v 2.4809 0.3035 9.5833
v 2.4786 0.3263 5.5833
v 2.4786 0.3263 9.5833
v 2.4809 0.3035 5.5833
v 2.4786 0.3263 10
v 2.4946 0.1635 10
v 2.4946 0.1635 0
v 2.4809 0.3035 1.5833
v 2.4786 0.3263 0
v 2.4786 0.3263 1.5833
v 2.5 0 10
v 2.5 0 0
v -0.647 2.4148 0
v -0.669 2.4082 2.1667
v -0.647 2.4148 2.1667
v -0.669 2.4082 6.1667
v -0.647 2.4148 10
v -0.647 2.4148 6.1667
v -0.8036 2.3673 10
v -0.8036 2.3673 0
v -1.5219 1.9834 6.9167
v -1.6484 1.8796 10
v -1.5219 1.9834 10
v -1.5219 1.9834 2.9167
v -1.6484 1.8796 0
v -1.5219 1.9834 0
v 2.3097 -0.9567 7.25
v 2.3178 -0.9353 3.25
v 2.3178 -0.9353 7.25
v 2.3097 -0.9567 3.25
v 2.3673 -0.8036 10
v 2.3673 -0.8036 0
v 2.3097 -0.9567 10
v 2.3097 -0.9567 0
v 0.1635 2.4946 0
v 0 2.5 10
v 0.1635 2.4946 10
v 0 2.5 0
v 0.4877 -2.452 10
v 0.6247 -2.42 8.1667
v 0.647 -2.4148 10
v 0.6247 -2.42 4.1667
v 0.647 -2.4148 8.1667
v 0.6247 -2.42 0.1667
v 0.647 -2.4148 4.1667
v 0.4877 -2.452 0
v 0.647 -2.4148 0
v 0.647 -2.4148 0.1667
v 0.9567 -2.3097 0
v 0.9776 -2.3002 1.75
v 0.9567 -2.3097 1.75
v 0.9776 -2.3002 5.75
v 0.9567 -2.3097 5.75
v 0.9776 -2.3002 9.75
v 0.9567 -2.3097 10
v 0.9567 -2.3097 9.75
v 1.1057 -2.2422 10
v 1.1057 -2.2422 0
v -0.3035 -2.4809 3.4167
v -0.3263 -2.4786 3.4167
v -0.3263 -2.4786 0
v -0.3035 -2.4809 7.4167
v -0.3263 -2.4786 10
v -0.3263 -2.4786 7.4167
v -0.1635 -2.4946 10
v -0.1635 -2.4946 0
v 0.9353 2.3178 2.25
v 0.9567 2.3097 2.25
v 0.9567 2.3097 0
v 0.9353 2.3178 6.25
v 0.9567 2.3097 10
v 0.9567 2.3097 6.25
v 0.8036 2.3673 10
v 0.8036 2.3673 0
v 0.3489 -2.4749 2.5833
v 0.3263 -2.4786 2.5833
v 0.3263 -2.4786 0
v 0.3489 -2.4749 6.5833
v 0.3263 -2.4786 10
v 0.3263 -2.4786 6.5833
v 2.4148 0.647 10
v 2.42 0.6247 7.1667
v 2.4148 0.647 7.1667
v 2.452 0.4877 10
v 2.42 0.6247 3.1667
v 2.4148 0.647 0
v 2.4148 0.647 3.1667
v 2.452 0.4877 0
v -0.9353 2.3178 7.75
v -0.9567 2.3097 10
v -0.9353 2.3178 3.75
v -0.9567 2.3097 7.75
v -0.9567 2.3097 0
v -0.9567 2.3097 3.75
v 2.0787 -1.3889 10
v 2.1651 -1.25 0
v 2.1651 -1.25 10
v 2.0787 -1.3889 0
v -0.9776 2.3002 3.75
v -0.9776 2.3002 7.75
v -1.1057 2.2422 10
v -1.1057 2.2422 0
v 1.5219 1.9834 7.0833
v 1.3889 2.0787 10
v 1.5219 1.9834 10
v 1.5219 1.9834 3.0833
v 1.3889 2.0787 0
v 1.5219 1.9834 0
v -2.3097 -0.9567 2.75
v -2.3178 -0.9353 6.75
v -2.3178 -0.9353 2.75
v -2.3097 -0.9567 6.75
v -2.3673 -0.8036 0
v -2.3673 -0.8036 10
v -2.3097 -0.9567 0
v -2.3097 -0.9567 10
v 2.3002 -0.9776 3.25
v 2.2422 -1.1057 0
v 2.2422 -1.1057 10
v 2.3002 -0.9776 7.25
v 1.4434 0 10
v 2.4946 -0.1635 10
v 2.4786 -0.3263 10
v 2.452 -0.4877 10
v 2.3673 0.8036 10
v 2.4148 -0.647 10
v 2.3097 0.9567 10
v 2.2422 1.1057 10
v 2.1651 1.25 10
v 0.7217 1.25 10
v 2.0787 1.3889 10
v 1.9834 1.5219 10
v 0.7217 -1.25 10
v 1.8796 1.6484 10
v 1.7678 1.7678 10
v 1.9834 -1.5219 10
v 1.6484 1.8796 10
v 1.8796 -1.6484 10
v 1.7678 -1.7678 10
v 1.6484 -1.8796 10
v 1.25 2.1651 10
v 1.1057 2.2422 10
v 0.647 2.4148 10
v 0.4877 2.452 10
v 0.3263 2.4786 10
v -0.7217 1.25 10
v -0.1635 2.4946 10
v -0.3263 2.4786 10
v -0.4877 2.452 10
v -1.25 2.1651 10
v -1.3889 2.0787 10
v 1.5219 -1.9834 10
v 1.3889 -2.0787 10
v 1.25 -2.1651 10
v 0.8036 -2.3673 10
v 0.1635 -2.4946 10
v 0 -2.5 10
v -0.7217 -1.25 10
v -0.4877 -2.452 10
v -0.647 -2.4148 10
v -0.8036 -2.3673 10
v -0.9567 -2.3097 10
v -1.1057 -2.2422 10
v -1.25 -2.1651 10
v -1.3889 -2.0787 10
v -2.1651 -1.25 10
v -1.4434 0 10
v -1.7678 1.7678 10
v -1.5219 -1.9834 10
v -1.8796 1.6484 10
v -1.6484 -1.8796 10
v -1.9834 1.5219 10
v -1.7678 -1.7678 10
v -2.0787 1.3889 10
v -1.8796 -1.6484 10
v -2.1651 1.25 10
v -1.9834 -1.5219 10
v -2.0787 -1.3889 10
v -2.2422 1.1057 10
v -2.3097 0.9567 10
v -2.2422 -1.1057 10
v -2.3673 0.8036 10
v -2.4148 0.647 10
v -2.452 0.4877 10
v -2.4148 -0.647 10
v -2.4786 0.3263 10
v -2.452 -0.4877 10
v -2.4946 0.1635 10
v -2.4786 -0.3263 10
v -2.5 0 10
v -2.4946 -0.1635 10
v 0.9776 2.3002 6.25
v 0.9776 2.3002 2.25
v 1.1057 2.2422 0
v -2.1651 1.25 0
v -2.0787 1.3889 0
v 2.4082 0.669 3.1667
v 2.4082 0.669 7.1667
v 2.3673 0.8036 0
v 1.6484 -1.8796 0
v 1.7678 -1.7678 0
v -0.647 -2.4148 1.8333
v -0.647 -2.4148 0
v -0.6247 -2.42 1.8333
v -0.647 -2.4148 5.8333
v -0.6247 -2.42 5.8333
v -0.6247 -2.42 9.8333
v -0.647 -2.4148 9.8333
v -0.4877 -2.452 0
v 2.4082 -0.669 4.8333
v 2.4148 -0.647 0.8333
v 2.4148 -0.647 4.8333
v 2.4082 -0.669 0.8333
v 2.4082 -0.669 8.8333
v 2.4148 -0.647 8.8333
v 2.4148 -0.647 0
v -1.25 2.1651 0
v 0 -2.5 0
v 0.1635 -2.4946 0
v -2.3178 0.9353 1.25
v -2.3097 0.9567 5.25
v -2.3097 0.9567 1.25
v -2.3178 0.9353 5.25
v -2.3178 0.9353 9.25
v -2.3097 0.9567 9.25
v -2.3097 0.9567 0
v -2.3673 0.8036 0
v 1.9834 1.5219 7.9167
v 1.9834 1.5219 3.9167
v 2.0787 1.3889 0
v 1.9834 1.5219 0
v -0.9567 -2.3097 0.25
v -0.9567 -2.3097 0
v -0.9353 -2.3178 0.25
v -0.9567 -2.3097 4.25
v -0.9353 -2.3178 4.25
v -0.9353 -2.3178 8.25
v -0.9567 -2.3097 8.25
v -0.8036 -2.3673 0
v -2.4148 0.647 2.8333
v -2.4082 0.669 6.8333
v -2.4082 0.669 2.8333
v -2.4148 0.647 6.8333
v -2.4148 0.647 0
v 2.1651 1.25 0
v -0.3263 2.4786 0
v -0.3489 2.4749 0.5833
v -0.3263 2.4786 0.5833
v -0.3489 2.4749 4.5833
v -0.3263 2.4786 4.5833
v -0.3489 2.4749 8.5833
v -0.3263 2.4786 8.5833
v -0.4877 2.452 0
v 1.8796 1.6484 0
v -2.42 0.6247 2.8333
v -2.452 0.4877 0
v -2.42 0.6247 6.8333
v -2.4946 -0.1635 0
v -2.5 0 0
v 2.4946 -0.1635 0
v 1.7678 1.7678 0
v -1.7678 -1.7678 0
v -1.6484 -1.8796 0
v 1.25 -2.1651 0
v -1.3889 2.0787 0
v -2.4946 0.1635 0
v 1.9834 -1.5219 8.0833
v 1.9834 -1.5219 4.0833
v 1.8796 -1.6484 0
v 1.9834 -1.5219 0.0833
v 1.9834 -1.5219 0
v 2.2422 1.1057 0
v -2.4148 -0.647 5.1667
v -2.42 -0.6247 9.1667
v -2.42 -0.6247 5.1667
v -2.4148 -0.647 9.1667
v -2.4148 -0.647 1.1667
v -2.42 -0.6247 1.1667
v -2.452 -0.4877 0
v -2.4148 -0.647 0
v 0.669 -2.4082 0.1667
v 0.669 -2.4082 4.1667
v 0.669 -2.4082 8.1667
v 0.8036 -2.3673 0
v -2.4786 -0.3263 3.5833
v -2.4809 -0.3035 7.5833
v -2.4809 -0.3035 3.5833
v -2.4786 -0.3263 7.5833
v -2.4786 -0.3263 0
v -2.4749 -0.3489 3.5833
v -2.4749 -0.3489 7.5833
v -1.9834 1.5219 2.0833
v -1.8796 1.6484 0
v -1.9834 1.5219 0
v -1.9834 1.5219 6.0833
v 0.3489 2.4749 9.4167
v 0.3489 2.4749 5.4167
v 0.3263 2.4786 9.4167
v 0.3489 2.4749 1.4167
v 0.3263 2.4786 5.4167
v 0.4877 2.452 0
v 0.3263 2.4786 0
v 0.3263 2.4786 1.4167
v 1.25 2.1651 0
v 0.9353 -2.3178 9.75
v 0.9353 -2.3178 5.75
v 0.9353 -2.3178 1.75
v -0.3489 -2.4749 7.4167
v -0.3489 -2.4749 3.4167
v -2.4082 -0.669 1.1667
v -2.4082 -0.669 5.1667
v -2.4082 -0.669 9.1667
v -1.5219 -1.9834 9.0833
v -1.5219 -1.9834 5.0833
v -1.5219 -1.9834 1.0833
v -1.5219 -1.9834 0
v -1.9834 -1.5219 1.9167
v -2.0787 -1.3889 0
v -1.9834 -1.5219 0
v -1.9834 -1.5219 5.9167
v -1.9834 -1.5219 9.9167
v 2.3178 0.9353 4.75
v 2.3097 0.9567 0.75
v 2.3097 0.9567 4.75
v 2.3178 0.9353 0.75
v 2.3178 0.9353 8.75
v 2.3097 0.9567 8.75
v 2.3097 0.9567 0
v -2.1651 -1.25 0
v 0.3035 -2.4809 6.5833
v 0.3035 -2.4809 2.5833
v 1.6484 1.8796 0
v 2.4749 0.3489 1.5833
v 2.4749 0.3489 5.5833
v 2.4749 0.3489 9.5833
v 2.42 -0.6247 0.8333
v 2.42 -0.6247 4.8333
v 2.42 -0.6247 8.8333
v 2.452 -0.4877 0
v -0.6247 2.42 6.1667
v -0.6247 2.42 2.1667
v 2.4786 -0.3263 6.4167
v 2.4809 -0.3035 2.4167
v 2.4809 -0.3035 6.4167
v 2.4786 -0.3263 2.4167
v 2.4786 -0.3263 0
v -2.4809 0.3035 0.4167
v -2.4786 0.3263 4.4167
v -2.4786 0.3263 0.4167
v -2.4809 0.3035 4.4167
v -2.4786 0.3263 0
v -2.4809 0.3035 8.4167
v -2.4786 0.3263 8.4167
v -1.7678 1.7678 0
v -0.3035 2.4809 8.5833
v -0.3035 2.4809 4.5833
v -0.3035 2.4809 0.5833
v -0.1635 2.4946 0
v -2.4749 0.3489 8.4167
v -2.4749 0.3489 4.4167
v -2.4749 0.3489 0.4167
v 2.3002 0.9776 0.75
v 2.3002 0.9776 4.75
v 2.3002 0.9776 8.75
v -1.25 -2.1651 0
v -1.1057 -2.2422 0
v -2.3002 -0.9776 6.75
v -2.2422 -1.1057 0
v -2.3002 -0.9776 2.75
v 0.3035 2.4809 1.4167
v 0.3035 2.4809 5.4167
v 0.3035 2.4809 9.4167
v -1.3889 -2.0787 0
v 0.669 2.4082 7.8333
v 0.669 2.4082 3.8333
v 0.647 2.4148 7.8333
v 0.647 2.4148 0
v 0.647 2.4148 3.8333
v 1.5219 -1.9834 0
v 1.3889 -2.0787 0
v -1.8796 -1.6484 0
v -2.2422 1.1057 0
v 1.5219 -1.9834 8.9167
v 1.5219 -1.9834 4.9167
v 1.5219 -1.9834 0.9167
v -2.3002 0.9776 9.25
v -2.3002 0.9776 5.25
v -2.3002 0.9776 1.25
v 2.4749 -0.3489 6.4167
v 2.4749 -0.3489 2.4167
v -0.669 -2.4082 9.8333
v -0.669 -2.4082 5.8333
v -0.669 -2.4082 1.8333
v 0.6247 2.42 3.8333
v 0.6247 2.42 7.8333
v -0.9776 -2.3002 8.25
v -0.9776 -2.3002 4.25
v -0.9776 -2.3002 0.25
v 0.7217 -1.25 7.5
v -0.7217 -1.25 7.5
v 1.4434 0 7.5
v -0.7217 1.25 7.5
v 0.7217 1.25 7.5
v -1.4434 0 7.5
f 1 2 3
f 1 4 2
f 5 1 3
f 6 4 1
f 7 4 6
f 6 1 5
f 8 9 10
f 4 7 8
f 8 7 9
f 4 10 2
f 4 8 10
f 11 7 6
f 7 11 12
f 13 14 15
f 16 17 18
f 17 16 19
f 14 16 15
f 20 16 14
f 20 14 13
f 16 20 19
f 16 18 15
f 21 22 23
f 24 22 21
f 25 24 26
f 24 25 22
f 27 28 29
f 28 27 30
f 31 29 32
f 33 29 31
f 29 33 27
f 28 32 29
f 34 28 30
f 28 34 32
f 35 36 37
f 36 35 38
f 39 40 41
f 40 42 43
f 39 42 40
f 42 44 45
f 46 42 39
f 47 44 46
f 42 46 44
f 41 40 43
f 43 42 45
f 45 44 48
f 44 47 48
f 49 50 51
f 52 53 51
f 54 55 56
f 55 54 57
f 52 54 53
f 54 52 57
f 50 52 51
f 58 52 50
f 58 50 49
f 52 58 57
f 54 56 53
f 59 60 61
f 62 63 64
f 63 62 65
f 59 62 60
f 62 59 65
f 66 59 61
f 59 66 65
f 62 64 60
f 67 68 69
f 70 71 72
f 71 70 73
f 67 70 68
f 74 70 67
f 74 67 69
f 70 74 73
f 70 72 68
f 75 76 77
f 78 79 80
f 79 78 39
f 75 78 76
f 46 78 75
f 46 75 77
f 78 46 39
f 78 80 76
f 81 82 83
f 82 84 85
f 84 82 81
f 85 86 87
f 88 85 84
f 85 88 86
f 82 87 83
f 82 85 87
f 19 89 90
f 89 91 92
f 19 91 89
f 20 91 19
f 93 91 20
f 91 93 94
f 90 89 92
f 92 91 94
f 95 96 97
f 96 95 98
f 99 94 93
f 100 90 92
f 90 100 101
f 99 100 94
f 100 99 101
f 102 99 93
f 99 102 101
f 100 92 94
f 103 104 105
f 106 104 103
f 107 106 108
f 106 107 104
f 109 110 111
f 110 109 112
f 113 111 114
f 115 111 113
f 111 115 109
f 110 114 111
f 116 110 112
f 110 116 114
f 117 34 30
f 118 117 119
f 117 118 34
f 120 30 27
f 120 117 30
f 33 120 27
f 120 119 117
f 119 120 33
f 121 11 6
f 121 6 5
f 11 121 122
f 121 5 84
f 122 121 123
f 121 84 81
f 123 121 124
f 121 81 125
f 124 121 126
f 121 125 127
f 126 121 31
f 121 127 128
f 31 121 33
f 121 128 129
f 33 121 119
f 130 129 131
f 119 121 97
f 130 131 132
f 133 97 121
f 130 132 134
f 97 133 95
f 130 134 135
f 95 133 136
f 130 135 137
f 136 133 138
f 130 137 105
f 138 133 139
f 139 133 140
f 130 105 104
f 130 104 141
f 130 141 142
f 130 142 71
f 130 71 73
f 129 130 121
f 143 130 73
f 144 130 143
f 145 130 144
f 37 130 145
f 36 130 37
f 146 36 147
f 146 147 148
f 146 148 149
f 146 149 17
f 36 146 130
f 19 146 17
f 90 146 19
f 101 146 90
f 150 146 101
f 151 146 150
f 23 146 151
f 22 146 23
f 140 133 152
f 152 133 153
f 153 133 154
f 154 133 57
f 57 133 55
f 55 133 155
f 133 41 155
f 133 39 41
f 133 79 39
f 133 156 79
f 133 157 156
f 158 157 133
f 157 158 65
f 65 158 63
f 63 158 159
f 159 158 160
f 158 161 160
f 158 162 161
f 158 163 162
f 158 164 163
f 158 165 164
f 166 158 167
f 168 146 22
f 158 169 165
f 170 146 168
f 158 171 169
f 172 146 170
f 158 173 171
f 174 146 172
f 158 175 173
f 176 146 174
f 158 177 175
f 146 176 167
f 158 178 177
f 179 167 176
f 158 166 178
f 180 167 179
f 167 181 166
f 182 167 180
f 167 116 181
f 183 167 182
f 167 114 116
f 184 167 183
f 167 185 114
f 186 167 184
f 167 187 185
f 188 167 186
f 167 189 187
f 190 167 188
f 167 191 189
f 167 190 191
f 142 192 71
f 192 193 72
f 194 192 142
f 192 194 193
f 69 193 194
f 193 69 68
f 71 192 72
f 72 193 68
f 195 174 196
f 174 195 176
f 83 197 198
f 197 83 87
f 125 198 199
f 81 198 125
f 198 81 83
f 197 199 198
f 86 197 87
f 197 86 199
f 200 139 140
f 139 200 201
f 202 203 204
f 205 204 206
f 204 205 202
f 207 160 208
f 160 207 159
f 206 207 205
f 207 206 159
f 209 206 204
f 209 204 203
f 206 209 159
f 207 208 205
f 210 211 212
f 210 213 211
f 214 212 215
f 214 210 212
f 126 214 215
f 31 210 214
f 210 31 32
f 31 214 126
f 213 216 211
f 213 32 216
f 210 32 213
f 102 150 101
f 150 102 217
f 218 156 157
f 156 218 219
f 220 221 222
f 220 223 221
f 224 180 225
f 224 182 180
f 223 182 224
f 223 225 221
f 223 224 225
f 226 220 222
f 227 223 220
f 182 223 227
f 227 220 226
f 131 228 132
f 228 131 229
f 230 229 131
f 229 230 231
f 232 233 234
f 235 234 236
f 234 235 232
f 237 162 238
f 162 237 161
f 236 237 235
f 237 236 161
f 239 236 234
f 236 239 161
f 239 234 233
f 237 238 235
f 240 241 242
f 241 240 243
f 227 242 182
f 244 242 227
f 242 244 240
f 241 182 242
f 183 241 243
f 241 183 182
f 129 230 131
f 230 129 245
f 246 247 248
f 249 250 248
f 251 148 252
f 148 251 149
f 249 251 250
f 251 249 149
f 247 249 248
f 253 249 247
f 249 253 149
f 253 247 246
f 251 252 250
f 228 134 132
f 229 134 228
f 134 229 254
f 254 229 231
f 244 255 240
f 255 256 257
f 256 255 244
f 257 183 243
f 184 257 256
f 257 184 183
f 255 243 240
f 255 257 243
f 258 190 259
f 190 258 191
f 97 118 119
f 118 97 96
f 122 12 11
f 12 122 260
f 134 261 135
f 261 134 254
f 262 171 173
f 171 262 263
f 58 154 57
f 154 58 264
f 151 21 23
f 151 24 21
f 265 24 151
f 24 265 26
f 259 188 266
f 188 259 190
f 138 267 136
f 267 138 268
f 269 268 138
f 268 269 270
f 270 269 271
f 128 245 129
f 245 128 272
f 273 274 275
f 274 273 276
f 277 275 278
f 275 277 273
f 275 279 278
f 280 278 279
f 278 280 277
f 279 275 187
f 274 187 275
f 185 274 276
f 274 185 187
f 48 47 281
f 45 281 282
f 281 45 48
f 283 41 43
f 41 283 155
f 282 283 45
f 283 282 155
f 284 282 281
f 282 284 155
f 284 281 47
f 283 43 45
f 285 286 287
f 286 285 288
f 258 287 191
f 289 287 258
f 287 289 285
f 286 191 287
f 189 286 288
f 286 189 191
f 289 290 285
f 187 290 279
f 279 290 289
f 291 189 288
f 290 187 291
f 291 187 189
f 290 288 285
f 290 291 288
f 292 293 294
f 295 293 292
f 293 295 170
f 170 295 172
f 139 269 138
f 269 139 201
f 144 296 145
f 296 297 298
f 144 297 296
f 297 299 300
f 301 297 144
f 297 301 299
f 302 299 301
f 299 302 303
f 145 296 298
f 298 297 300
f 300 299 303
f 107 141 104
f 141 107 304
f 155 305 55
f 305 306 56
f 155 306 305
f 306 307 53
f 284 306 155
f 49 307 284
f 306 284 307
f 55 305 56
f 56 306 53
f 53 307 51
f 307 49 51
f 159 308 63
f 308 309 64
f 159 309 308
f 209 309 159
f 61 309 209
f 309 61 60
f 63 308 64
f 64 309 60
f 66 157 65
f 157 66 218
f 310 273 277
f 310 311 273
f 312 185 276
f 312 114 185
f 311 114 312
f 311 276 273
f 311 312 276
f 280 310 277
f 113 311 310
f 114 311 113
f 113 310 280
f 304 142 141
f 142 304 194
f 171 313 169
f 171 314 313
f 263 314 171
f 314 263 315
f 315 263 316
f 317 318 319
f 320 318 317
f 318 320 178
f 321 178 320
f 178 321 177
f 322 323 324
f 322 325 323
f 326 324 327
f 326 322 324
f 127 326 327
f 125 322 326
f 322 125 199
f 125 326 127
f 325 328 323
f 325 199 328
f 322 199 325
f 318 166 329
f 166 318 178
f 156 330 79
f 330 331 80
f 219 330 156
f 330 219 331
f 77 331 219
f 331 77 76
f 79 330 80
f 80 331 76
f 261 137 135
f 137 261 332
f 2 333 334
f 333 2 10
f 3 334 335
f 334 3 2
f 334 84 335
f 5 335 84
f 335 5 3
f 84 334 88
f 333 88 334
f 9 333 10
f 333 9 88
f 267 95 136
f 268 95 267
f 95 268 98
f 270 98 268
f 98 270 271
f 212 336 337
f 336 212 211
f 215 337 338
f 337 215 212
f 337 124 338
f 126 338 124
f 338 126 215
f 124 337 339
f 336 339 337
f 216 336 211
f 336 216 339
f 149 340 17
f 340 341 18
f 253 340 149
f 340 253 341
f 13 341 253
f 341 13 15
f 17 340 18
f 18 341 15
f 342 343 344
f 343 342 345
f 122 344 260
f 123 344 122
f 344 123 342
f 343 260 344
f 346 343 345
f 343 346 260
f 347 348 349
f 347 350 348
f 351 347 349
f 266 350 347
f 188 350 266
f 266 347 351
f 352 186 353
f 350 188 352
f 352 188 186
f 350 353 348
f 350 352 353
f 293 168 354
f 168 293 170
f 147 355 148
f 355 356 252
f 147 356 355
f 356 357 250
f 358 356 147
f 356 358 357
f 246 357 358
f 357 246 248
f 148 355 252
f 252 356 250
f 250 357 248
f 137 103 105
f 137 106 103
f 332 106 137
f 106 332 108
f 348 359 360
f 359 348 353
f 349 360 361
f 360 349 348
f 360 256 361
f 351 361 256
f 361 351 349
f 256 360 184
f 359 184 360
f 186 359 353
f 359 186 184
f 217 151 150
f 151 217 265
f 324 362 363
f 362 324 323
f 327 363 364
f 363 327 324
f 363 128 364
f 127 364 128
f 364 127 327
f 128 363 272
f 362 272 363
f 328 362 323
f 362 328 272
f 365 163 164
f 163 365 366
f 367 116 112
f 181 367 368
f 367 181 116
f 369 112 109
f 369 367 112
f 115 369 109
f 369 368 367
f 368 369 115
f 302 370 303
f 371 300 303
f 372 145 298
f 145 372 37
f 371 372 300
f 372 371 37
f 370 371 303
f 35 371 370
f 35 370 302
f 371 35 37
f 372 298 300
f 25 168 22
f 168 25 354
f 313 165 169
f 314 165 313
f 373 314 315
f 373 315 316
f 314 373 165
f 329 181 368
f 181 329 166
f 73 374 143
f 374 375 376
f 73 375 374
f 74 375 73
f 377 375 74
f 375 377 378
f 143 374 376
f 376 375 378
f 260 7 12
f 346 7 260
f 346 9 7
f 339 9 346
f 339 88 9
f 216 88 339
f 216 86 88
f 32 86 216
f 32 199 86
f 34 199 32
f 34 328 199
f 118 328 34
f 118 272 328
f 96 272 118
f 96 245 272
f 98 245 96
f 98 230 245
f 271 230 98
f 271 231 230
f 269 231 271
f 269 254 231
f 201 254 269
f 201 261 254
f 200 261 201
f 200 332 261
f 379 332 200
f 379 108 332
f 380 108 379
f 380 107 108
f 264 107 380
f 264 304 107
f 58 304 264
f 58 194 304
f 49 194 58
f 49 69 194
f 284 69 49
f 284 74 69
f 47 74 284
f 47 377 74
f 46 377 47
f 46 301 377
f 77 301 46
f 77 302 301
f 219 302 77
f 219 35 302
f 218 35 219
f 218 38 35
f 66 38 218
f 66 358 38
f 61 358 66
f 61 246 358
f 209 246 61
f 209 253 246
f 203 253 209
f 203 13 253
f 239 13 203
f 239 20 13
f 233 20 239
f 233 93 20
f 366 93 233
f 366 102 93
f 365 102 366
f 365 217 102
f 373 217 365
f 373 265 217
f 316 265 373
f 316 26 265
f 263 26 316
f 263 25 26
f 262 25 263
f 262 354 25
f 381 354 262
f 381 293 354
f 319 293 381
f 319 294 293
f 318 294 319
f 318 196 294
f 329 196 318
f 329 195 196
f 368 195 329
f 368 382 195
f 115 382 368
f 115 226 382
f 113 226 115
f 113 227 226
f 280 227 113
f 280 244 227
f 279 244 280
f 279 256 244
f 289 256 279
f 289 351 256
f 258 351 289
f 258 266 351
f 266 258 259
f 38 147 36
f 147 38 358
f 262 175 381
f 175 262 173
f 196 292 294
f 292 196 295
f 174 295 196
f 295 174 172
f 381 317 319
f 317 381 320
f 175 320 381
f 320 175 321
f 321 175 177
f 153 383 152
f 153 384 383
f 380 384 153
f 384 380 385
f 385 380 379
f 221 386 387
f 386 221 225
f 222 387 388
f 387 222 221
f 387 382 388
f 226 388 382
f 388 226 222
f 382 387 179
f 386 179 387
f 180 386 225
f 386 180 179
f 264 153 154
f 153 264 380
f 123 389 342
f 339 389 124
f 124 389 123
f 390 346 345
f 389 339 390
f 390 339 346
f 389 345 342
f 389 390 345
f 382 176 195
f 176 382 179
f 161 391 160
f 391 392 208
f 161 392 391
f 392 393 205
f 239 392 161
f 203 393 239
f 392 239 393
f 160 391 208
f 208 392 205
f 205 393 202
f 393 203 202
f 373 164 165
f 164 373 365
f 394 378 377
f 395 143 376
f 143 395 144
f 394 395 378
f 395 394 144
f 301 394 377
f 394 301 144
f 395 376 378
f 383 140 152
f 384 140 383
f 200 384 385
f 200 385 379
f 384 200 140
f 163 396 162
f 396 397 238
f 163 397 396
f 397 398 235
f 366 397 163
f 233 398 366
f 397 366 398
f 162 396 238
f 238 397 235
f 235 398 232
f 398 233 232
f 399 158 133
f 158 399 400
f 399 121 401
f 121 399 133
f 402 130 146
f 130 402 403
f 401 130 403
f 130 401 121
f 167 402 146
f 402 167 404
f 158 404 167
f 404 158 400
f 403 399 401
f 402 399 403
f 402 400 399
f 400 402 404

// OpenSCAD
$fn=96;

module hex_socket(h=2.5, af=2.5) {
    r = af / sqrt(3);
    cylinder(h=h, r=r, $fn=6);
}

module grub_screw_M5(length=10, d=5, pitch=0.8, thread_depth=0.35, socket_depth=2.5, socket_af=2.5) {
    difference() {
        union() {
            cylinder(h=length, d=d);
            translate([0,0,0])
                cylinder(h=0.8, d1=d-0.6, d2=d);
            translate([0,0,length-0.8])
                cylinder(h=0.8, d1=d, d2=d-0.6);
            linear_extrude(height=length, twist=360*length/pitch, slices=max(ceil(length*12), 60), convexity=10)
                translate([d/2 - thread_depth, 0, 0])
                    circle(r=thread_depth);
        }
        translate([0,0,length - socket_depth])
            hex_socket(h=socket_depth + 0.2, af=socket_af);
    }
}

grub_screw_M5(length=10);
